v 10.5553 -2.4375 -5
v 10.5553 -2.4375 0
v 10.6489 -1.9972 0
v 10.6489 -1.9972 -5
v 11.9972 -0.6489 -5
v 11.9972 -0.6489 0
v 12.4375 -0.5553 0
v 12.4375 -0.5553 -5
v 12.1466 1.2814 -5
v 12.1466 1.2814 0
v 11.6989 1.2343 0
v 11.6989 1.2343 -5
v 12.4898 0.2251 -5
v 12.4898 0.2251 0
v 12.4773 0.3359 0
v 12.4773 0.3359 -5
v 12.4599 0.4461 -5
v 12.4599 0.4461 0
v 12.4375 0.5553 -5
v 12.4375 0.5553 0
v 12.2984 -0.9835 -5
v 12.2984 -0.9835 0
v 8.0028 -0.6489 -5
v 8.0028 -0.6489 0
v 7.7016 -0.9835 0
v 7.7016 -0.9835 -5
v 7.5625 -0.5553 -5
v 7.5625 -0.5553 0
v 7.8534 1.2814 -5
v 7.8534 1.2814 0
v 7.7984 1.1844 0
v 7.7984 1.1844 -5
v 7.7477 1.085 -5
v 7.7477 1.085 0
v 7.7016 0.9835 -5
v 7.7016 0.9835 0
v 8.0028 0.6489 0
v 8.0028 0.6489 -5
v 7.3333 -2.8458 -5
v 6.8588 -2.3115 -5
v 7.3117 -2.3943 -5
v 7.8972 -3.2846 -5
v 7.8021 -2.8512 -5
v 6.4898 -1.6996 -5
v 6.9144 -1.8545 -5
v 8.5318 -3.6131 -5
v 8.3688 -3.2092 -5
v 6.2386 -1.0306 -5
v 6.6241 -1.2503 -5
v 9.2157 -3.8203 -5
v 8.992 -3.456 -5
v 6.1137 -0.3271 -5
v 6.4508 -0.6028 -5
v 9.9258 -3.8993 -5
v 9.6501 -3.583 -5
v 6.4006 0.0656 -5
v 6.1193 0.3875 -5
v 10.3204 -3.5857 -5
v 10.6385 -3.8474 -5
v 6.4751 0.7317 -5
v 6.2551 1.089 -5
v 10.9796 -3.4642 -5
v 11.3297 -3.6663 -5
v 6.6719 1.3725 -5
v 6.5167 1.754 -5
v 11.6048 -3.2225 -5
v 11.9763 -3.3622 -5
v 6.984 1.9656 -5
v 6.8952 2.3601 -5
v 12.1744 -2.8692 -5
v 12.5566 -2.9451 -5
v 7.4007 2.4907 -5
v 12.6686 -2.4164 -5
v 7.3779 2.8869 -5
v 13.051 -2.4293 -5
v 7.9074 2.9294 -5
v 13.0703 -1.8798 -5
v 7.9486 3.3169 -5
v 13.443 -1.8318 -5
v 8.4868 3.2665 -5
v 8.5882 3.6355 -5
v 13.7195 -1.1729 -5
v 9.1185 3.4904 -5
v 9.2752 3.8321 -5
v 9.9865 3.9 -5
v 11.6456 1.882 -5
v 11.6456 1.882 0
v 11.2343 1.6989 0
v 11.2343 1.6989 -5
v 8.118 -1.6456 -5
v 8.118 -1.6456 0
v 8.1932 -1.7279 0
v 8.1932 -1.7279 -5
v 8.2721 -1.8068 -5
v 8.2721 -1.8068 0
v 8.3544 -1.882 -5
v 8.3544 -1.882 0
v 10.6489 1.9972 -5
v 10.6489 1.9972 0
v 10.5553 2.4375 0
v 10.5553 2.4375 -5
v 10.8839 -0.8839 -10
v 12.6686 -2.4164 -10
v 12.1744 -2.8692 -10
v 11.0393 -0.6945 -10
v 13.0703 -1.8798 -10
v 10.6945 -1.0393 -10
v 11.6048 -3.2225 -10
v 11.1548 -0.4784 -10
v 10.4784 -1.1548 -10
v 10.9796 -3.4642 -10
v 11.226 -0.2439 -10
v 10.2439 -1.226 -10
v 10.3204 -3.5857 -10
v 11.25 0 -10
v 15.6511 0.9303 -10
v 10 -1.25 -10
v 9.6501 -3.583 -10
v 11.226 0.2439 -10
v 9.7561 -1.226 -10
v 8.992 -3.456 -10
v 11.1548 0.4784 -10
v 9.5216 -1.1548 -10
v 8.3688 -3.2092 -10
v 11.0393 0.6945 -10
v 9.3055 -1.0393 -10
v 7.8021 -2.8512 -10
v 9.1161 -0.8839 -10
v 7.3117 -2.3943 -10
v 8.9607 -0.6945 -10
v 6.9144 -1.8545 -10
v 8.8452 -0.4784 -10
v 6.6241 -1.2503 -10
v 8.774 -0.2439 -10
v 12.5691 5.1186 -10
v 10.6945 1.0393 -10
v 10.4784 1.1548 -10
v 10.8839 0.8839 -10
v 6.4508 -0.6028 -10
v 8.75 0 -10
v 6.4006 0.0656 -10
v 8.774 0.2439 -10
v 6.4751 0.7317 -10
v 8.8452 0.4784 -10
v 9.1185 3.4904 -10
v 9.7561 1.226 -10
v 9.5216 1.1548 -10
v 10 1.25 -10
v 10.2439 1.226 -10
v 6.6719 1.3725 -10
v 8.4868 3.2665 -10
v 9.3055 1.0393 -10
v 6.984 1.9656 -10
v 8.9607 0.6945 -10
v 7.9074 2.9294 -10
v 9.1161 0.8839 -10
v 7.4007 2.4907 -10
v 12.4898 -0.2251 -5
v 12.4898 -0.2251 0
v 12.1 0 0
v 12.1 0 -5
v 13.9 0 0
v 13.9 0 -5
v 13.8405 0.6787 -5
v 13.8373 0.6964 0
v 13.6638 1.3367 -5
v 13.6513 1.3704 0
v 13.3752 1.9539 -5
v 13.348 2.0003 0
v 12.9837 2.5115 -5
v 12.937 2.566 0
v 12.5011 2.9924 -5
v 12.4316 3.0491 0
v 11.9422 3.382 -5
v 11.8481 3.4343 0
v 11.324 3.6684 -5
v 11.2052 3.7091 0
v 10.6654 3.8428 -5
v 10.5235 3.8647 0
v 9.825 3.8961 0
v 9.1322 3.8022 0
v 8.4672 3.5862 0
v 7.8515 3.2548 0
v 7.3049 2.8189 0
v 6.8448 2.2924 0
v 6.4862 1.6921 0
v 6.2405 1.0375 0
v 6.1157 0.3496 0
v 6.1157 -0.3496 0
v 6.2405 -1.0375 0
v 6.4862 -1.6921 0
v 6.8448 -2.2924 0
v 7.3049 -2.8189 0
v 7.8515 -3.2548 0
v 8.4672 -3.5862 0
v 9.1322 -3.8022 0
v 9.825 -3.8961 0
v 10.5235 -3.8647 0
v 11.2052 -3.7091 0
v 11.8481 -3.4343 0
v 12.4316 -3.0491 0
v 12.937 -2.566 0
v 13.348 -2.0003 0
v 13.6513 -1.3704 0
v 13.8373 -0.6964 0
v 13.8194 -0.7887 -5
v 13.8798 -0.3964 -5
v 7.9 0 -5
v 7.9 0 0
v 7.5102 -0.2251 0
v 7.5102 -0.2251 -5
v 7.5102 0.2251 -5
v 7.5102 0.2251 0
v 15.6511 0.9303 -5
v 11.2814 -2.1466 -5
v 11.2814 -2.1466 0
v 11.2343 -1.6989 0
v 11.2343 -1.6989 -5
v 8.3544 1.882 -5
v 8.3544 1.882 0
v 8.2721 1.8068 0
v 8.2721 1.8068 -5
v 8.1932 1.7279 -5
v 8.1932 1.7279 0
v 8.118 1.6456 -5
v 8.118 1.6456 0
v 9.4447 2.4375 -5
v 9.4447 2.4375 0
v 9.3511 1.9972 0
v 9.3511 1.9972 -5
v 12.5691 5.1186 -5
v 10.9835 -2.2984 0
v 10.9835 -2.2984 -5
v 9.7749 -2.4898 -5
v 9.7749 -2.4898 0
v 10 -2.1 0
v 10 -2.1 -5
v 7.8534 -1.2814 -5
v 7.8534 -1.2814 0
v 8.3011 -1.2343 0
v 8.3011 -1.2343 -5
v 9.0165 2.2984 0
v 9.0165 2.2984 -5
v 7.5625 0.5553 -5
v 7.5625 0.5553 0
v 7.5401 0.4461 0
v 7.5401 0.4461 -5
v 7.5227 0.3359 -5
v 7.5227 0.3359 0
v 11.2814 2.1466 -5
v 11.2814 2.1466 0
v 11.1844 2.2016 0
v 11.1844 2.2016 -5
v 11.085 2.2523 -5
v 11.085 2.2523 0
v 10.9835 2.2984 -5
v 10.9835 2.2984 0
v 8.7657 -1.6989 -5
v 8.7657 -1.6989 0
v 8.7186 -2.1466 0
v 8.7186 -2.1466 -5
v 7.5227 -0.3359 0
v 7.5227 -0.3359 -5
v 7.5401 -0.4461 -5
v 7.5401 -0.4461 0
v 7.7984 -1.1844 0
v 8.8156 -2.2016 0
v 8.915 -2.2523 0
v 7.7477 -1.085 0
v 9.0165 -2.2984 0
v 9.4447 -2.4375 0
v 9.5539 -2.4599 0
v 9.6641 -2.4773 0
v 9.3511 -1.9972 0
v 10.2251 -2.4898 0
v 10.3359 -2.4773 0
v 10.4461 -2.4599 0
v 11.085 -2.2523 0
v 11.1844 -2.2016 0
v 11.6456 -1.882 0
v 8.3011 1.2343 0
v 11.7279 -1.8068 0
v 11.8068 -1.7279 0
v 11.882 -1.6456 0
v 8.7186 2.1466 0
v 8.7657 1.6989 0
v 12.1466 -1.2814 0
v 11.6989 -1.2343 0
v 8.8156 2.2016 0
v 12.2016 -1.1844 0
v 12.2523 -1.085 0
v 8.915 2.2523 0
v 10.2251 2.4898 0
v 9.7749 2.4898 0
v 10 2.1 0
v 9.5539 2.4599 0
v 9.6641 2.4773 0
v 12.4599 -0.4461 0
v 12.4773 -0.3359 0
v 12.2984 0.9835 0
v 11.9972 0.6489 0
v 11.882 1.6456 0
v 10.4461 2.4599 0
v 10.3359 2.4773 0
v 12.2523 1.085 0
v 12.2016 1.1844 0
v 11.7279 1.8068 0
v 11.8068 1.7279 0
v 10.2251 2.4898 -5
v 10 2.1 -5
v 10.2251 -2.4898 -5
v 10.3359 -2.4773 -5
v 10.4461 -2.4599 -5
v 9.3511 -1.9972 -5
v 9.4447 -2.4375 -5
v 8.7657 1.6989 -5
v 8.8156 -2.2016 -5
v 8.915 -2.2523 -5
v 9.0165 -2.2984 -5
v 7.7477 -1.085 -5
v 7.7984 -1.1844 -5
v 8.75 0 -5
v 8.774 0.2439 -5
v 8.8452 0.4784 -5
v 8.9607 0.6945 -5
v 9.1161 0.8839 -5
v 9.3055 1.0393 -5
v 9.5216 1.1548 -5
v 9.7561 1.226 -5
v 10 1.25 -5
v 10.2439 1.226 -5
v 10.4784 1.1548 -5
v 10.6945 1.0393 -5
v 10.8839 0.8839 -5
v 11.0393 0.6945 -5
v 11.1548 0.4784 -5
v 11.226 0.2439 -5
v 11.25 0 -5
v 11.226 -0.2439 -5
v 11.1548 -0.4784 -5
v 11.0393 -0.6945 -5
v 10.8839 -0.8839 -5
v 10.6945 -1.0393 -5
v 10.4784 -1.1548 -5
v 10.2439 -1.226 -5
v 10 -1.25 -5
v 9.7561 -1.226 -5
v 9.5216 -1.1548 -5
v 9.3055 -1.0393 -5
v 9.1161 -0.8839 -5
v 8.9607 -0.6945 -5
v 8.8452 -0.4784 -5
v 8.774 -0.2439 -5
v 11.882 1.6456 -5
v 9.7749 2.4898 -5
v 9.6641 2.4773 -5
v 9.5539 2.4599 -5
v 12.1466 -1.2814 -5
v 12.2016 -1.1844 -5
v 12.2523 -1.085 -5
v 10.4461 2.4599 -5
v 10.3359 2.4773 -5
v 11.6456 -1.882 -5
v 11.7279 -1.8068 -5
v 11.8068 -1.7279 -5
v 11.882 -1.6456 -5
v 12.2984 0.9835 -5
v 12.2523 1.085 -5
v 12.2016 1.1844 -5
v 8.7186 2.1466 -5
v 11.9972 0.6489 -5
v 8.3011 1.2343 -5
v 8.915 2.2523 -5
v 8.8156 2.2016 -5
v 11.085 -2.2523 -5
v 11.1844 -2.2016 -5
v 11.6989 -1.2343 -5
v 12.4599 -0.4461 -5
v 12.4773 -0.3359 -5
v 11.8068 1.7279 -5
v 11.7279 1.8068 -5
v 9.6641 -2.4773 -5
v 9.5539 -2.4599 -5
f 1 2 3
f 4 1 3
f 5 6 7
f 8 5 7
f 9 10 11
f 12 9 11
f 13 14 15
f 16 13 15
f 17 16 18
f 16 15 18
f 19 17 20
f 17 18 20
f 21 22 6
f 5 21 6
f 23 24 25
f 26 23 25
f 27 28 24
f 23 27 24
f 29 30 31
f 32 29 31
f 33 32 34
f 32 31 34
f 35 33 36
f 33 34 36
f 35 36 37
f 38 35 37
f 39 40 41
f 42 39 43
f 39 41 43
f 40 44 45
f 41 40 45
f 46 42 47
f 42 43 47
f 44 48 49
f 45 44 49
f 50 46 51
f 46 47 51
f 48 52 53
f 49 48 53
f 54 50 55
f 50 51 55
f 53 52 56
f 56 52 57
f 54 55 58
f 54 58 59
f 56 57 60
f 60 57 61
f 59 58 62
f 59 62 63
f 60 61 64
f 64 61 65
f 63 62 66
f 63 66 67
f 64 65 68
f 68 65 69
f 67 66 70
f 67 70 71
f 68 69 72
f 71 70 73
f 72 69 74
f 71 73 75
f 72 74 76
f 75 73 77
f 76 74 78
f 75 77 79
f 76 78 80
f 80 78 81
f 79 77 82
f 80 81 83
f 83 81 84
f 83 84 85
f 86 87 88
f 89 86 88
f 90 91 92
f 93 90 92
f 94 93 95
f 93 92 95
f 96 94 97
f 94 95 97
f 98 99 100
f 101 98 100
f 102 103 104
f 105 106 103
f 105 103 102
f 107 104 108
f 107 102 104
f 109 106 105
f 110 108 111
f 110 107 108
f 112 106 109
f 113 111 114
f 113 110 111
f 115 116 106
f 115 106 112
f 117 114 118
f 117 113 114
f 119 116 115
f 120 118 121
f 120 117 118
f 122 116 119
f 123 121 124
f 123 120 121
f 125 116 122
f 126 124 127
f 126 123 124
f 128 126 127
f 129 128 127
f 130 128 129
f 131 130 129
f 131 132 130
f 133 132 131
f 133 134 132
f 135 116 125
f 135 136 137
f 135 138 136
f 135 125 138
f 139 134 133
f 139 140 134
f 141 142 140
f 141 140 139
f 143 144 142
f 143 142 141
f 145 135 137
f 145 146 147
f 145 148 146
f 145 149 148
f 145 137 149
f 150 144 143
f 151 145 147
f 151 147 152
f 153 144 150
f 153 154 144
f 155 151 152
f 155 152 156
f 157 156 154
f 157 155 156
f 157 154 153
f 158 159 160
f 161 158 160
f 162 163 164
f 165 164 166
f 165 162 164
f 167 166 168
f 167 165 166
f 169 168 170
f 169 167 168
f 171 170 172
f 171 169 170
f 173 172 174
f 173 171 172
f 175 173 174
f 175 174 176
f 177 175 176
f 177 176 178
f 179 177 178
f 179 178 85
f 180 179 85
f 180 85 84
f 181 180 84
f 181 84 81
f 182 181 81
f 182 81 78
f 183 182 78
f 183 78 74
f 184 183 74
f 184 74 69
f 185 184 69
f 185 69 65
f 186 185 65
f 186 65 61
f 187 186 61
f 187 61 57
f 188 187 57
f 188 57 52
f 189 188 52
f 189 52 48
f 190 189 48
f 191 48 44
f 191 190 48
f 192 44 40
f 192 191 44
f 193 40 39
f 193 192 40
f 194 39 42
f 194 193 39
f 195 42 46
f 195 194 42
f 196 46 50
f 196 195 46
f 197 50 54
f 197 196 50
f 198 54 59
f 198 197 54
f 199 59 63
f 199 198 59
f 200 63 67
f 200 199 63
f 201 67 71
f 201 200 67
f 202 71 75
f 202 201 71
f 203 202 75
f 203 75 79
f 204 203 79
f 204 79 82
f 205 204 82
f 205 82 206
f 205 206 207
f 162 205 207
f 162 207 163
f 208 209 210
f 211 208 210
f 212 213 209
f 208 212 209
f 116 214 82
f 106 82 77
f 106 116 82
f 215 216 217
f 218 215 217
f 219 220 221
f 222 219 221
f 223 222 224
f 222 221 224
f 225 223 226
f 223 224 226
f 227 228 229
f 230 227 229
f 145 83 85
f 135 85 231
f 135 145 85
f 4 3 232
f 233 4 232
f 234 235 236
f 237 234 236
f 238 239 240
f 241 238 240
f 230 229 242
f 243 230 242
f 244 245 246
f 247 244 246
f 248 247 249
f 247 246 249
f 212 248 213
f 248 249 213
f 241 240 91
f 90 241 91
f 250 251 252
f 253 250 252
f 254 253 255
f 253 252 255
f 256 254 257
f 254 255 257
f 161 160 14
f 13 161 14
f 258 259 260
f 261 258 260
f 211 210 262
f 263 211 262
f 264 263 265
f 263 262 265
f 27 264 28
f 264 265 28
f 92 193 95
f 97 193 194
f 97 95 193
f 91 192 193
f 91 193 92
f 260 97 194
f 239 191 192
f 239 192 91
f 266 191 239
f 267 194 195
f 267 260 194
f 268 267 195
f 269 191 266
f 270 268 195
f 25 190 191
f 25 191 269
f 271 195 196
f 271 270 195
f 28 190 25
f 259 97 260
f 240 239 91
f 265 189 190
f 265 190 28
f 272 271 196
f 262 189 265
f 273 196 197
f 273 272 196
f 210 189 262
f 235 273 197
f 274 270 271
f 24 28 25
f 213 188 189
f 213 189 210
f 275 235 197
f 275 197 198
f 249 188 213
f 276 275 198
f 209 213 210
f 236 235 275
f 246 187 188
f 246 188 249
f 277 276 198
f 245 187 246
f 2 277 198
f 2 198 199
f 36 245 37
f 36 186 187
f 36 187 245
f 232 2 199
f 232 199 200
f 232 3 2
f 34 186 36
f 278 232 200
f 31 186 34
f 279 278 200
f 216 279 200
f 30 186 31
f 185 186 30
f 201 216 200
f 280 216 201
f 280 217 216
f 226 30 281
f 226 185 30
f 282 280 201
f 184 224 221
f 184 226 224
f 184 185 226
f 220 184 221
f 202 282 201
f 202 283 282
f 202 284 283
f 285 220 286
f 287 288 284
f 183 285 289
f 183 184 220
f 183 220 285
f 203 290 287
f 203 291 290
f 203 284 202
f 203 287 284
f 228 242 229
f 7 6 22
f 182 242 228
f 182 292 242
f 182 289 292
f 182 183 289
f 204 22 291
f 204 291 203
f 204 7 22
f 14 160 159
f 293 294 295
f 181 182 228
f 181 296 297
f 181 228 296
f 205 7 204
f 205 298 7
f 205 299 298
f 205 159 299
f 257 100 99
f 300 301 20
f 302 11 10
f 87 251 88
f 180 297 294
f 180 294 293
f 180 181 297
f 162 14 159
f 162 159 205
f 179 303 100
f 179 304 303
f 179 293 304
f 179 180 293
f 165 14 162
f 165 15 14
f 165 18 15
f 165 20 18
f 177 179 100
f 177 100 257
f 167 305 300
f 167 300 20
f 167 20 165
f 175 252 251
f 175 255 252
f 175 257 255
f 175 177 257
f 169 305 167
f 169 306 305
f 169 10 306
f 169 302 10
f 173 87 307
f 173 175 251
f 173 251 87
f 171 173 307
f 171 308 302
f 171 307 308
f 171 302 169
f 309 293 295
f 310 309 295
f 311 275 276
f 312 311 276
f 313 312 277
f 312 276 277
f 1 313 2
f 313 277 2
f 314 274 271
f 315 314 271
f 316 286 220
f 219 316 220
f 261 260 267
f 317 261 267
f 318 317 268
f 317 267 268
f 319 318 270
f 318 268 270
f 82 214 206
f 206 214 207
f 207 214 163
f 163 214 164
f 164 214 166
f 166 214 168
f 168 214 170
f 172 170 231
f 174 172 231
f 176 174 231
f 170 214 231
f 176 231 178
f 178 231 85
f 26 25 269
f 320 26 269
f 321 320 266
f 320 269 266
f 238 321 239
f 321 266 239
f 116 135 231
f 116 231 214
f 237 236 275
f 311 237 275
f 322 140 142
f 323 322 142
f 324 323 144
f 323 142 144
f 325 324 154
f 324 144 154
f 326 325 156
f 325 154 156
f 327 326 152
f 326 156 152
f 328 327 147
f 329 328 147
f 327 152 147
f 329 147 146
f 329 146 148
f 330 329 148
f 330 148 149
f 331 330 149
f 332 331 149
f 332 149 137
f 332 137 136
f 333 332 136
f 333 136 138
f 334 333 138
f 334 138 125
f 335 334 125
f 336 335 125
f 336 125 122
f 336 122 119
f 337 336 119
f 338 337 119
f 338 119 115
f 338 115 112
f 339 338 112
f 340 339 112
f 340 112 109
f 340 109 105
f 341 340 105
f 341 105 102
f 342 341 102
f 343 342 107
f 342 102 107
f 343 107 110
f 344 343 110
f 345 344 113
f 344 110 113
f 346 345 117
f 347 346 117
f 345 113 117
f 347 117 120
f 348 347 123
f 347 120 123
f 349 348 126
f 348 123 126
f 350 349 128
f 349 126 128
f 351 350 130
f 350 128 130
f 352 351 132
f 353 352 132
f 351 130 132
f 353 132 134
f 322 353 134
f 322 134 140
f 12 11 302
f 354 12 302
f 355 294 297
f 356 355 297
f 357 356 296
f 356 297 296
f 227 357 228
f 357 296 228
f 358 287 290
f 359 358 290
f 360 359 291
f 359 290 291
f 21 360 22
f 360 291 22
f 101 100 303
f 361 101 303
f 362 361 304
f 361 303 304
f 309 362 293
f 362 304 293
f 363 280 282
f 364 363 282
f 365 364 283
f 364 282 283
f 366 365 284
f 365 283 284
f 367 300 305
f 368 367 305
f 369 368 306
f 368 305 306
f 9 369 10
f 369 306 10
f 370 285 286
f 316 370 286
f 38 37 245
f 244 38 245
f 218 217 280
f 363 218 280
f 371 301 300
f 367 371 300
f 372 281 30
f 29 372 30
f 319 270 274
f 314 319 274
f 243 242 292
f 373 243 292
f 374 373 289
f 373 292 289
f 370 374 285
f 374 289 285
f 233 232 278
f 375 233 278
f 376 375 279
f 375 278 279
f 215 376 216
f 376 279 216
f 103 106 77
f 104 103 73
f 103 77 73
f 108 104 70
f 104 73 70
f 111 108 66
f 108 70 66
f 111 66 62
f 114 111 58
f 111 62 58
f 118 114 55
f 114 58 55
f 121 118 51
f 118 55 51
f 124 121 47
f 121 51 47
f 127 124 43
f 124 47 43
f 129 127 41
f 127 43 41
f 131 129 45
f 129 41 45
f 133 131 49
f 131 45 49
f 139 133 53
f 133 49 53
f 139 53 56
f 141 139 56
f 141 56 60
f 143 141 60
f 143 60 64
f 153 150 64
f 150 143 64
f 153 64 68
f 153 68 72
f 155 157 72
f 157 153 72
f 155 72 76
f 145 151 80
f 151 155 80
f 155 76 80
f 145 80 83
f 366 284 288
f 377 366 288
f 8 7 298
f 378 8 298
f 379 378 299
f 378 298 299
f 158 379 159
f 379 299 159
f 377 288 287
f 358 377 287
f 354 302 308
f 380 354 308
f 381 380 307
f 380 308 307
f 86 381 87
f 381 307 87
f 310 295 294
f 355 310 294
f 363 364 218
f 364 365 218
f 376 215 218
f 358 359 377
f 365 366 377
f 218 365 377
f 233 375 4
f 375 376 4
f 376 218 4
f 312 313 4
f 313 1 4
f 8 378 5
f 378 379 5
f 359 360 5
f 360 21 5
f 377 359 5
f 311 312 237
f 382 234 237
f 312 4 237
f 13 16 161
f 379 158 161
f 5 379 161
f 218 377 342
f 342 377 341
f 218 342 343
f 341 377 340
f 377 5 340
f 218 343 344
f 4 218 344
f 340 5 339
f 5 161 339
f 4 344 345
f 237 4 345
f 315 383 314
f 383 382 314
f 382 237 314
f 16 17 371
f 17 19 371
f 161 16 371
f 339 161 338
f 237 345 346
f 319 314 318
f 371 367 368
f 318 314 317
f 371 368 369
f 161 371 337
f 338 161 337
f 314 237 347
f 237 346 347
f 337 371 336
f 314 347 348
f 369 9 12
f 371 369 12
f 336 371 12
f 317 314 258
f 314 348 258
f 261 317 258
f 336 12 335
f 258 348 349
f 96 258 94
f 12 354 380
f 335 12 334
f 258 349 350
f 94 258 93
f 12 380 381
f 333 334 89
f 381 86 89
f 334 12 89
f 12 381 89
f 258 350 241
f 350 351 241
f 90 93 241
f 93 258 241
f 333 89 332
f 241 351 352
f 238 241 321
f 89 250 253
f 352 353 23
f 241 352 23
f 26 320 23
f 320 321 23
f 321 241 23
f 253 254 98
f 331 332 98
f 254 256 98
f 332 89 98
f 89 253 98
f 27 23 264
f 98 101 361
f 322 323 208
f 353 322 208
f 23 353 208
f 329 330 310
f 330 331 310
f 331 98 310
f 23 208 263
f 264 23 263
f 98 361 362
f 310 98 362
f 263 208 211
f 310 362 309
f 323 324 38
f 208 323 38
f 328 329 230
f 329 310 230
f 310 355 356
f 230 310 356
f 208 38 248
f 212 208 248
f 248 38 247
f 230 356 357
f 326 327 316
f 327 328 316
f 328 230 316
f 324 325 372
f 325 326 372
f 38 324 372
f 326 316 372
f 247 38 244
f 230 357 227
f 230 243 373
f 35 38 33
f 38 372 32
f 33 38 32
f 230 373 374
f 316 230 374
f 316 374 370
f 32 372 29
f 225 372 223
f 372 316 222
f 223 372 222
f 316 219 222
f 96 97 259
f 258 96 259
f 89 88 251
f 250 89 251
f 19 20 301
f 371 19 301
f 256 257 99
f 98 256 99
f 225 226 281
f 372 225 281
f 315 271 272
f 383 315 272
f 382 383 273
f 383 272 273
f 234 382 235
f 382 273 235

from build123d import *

# Parameters (mm, degrees)
SKETCH3_R           = 3.9
BOSS_EXTRUDE1_DEPTH = 5
SKETCH5_R           = 3.6
BOSS_EXTRUDE2_DEPTH = 5
BOSS_EXTRUDE3_DEPTH = 5
SKETCH7_R           = 1.25
CUT_EXTRUDE1_DEPTH  = 11


with BuildPart() as part:
    # Sketch3 → Boss-Extrude1 (new body)
    with BuildSketch(Plane.XY):
        with Locations((10, 0)):
            Circle(SKETCH3_R)
        with BuildLine():
            Line((10, 2.1), (9.774921544, 2.489847322))
            ThreePointArc((9.774921544, 2.489847322), (9.608913837, 2.469220851), (9.444657197, 2.437538589))
            Line((9.444657197, 2.437538589), (9.351064312, 1.997218684))
            Line((9.351064312, 1.997218684), (9.016532531, 2.298432452))
            ThreePointArc((9.016532531, 2.298432452), (8.865023751, 2.22751631), (8.71859676, 2.146626594))
            Line((8.71859676, 2.146626594), (8.76565097, 1.698935688))
            Line((8.76565097, 1.698935688), (8.354412167, 1.882031))
            ThreePointArc((8.354412167, 1.882031), (8.232233047, 1.767766953), (8.117969, 1.645587833))
            Line((8.117969, 1.645587833), (8.301064312, 1.23434903))
            Line((8.301064312, 1.23434903), (7.853373406, 1.28140324))
            ThreePointArc((7.853373406, 1.28140324), (7.77248369, 1.134976249), (7.701567548, 0.983467469))
            Line((7.701567548, 0.983467469), (8.002781316, 0.648935688))
            Line((8.002781316, 0.648935688), (7.562461411, 0.555342803))
            ThreePointArc((7.562461411, 0.555342803), (7.530779149, 0.391086163), (7.510152678, 0.225078456))
            Line((7.510152678, 0.225078456), (7.9, 0))
            Line((7.9, 0), (7.510152678, -0.225078456))
            ThreePointArc((7.510152678, -0.225078456), (7.530779149, -0.391086163), (7.562461411, -0.555342803))
            Line((7.562461411, -0.555342803), (8.002781316, -0.648935688))
            Line((8.002781316, -0.648935688), (7.701567548, -0.983467469))
            ThreePointArc((7.701567548, -0.983467469), (7.77248369, -1.134976249), (7.853373406, -1.28140324))
            Line((7.853373406, -1.28140324), (8.301064312, -1.23434903))
            Line((8.301064312, -1.23434903), (8.117969, -1.645587833))
            ThreePointArc((8.117969, -1.645587833), (8.232233047, -1.767766953), (8.354412167, -1.882031))
            Line((8.354412167, -1.882031), (8.76565097, -1.698935688))
            Line((8.76565097, -1.698935688), (8.71859676, -2.146626594))
            ThreePointArc((8.71859676, -2.146626594), (8.865023751, -2.22751631), (9.016532531, -2.298432452))
            Line((9.016532531, -2.298432452), (9.351064312, -1.997218684))
            Line((9.351064312, -1.997218684), (9.444657197, -2.437538589))
            ThreePointArc((9.444657197, -2.437538589), (9.608913837, -2.469220851), (9.774921544, -2.489847322))
            Line((9.774921544, -2.489847322), (10, -2.1))
            Line((10, -2.1), (10.225078456, -2.489847322))
            ThreePointArc((10.225078456, -2.489847322), (10.391086163, -2.469220851), (10.555342803, -2.437538589))
            Line((10.555342803, -2.437538589), (10.648935688, -1.997218684))
            Line((10.648935688, -1.997218684), (10.983467469, -2.298432452))
            ThreePointArc((10.983467469, -2.298432452), (11.134976249, -2.22751631), (11.28140324, -2.146626594))
            Line((11.28140324, -2.146626594), (11.23434903, -1.698935688))
            Line((11.23434903, -1.698935688), (11.645587833, -1.882031))
            ThreePointArc((11.645587833, -1.882031), (11.767766953, -1.767766953), (11.882031, -1.645587833))
            Line((11.882031, -1.645587833), (11.698935688, -1.23434903))
            Line((11.698935688, -1.23434903), (12.146626594, -1.28140324))
            ThreePointArc((12.146626594, -1.28140324), (12.22751631, -1.134976249), (12.298432452, -0.983467469))
            Line((12.298432452, -0.983467469), (11.997218684, -0.648935688))
            Line((11.997218684, -0.648935688), (12.437538589, -0.555342803))
            ThreePointArc((12.437538589, -0.555342803), (12.469220851, -0.391086163), (12.489847322, -0.225078456))
            Line((12.489847322, -0.225078456), (12.1, 0))
            Line((12.1, 0), (12.489847322, 0.225078456))
            ThreePointArc((12.489847322, 0.225078456), (12.469220851, 0.391086163), (12.437538589, 0.555342803))
            Line((12.437538589, 0.555342803), (11.997218684, 0.648935688))
            Line((11.997218684, 0.648935688), (12.298432452, 0.983467469))
            ThreePointArc((12.298432452, 0.983467469), (12.22751631, 1.134976249), (12.146626594, 1.28140324))
            Line((12.146626594, 1.28140324), (11.698935688, 1.23434903))
            Line((11.698935688, 1.23434903), (11.882031, 1.645587833))
            ThreePointArc((11.882031, 1.645587833), (11.767766953, 1.767766953), (11.645587833, 1.882031))
            Line((11.645587833, 1.882031), (11.23434903, 1.698935688))
            Line((11.23434903, 1.698935688), (11.28140324, 2.146626594))
            ThreePointArc((11.28140324, 2.146626594), (11.134976249, 2.22751631), (10.983467469, 2.298432452))
            Line((10.983467469, 2.298432452), (10.648935688, 1.997218684))
            Line((10.648935688, 1.997218684), (10.555342803, 2.437538589))
            ThreePointArc((10.555342803, 2.437538589), (10.391086163, 2.469220851), (10.225078456, 2.489847322))
            Line((10.225078456, 2.489847322), (10, 2.1))
        make_face(mode=Mode.SUBTRACT)
    extrude(amount=-BOSS_EXTRUDE1_DEPTH)

    # Sketch5 → Boss-Extrude2 (add)
    with BuildSketch(Plane(origin=(0, 0, -5), x_dir=(-1, 0, 0), z_dir=(0, 0, -1))):
        with Locations((-10, 0)):
            Circle(SKETCH5_R)
    extrude(amount=BOSS_EXTRUDE2_DEPTH)

    # Sketch6 → Boss-Extrude3 (add)
    with BuildSketch(Plane(origin=(0, 0, -10), x_dir=(-1, 0, 0), z_dir=(0, 0, -1))):
        with BuildLine():
            ThreePointArc((-13.070257041, -1.879766396), (-12.89955723, 2.133674734), (-9.118539931, 3.49041948))
            Line((-9.118539931, 3.49041948), (-12.569087005, 5.118573235))
            Line((-12.569087005, 5.118573235), (-15.65106162, 0.930323902))
            Line((-15.65106162, 0.930323902), (-13.070257041, -1.879766396))
        make_face()
    extrude(amount=-BOSS_EXTRUDE3_DEPTH)

    # Sketch7 → Cut-Extrude1 (cut, through all)
    with BuildSketch(Plane(origin=(0, 0, -10), x_dir=(-1, 0, 0), z_dir=(0, 0, -1))):
        with Locations((-10, 0)):
            Circle(SKETCH7_R)
    extrude(amount=-CUT_EXTRUDE1_DEPTH, mode=Mode.SUBTRACT)


solid = part.part
